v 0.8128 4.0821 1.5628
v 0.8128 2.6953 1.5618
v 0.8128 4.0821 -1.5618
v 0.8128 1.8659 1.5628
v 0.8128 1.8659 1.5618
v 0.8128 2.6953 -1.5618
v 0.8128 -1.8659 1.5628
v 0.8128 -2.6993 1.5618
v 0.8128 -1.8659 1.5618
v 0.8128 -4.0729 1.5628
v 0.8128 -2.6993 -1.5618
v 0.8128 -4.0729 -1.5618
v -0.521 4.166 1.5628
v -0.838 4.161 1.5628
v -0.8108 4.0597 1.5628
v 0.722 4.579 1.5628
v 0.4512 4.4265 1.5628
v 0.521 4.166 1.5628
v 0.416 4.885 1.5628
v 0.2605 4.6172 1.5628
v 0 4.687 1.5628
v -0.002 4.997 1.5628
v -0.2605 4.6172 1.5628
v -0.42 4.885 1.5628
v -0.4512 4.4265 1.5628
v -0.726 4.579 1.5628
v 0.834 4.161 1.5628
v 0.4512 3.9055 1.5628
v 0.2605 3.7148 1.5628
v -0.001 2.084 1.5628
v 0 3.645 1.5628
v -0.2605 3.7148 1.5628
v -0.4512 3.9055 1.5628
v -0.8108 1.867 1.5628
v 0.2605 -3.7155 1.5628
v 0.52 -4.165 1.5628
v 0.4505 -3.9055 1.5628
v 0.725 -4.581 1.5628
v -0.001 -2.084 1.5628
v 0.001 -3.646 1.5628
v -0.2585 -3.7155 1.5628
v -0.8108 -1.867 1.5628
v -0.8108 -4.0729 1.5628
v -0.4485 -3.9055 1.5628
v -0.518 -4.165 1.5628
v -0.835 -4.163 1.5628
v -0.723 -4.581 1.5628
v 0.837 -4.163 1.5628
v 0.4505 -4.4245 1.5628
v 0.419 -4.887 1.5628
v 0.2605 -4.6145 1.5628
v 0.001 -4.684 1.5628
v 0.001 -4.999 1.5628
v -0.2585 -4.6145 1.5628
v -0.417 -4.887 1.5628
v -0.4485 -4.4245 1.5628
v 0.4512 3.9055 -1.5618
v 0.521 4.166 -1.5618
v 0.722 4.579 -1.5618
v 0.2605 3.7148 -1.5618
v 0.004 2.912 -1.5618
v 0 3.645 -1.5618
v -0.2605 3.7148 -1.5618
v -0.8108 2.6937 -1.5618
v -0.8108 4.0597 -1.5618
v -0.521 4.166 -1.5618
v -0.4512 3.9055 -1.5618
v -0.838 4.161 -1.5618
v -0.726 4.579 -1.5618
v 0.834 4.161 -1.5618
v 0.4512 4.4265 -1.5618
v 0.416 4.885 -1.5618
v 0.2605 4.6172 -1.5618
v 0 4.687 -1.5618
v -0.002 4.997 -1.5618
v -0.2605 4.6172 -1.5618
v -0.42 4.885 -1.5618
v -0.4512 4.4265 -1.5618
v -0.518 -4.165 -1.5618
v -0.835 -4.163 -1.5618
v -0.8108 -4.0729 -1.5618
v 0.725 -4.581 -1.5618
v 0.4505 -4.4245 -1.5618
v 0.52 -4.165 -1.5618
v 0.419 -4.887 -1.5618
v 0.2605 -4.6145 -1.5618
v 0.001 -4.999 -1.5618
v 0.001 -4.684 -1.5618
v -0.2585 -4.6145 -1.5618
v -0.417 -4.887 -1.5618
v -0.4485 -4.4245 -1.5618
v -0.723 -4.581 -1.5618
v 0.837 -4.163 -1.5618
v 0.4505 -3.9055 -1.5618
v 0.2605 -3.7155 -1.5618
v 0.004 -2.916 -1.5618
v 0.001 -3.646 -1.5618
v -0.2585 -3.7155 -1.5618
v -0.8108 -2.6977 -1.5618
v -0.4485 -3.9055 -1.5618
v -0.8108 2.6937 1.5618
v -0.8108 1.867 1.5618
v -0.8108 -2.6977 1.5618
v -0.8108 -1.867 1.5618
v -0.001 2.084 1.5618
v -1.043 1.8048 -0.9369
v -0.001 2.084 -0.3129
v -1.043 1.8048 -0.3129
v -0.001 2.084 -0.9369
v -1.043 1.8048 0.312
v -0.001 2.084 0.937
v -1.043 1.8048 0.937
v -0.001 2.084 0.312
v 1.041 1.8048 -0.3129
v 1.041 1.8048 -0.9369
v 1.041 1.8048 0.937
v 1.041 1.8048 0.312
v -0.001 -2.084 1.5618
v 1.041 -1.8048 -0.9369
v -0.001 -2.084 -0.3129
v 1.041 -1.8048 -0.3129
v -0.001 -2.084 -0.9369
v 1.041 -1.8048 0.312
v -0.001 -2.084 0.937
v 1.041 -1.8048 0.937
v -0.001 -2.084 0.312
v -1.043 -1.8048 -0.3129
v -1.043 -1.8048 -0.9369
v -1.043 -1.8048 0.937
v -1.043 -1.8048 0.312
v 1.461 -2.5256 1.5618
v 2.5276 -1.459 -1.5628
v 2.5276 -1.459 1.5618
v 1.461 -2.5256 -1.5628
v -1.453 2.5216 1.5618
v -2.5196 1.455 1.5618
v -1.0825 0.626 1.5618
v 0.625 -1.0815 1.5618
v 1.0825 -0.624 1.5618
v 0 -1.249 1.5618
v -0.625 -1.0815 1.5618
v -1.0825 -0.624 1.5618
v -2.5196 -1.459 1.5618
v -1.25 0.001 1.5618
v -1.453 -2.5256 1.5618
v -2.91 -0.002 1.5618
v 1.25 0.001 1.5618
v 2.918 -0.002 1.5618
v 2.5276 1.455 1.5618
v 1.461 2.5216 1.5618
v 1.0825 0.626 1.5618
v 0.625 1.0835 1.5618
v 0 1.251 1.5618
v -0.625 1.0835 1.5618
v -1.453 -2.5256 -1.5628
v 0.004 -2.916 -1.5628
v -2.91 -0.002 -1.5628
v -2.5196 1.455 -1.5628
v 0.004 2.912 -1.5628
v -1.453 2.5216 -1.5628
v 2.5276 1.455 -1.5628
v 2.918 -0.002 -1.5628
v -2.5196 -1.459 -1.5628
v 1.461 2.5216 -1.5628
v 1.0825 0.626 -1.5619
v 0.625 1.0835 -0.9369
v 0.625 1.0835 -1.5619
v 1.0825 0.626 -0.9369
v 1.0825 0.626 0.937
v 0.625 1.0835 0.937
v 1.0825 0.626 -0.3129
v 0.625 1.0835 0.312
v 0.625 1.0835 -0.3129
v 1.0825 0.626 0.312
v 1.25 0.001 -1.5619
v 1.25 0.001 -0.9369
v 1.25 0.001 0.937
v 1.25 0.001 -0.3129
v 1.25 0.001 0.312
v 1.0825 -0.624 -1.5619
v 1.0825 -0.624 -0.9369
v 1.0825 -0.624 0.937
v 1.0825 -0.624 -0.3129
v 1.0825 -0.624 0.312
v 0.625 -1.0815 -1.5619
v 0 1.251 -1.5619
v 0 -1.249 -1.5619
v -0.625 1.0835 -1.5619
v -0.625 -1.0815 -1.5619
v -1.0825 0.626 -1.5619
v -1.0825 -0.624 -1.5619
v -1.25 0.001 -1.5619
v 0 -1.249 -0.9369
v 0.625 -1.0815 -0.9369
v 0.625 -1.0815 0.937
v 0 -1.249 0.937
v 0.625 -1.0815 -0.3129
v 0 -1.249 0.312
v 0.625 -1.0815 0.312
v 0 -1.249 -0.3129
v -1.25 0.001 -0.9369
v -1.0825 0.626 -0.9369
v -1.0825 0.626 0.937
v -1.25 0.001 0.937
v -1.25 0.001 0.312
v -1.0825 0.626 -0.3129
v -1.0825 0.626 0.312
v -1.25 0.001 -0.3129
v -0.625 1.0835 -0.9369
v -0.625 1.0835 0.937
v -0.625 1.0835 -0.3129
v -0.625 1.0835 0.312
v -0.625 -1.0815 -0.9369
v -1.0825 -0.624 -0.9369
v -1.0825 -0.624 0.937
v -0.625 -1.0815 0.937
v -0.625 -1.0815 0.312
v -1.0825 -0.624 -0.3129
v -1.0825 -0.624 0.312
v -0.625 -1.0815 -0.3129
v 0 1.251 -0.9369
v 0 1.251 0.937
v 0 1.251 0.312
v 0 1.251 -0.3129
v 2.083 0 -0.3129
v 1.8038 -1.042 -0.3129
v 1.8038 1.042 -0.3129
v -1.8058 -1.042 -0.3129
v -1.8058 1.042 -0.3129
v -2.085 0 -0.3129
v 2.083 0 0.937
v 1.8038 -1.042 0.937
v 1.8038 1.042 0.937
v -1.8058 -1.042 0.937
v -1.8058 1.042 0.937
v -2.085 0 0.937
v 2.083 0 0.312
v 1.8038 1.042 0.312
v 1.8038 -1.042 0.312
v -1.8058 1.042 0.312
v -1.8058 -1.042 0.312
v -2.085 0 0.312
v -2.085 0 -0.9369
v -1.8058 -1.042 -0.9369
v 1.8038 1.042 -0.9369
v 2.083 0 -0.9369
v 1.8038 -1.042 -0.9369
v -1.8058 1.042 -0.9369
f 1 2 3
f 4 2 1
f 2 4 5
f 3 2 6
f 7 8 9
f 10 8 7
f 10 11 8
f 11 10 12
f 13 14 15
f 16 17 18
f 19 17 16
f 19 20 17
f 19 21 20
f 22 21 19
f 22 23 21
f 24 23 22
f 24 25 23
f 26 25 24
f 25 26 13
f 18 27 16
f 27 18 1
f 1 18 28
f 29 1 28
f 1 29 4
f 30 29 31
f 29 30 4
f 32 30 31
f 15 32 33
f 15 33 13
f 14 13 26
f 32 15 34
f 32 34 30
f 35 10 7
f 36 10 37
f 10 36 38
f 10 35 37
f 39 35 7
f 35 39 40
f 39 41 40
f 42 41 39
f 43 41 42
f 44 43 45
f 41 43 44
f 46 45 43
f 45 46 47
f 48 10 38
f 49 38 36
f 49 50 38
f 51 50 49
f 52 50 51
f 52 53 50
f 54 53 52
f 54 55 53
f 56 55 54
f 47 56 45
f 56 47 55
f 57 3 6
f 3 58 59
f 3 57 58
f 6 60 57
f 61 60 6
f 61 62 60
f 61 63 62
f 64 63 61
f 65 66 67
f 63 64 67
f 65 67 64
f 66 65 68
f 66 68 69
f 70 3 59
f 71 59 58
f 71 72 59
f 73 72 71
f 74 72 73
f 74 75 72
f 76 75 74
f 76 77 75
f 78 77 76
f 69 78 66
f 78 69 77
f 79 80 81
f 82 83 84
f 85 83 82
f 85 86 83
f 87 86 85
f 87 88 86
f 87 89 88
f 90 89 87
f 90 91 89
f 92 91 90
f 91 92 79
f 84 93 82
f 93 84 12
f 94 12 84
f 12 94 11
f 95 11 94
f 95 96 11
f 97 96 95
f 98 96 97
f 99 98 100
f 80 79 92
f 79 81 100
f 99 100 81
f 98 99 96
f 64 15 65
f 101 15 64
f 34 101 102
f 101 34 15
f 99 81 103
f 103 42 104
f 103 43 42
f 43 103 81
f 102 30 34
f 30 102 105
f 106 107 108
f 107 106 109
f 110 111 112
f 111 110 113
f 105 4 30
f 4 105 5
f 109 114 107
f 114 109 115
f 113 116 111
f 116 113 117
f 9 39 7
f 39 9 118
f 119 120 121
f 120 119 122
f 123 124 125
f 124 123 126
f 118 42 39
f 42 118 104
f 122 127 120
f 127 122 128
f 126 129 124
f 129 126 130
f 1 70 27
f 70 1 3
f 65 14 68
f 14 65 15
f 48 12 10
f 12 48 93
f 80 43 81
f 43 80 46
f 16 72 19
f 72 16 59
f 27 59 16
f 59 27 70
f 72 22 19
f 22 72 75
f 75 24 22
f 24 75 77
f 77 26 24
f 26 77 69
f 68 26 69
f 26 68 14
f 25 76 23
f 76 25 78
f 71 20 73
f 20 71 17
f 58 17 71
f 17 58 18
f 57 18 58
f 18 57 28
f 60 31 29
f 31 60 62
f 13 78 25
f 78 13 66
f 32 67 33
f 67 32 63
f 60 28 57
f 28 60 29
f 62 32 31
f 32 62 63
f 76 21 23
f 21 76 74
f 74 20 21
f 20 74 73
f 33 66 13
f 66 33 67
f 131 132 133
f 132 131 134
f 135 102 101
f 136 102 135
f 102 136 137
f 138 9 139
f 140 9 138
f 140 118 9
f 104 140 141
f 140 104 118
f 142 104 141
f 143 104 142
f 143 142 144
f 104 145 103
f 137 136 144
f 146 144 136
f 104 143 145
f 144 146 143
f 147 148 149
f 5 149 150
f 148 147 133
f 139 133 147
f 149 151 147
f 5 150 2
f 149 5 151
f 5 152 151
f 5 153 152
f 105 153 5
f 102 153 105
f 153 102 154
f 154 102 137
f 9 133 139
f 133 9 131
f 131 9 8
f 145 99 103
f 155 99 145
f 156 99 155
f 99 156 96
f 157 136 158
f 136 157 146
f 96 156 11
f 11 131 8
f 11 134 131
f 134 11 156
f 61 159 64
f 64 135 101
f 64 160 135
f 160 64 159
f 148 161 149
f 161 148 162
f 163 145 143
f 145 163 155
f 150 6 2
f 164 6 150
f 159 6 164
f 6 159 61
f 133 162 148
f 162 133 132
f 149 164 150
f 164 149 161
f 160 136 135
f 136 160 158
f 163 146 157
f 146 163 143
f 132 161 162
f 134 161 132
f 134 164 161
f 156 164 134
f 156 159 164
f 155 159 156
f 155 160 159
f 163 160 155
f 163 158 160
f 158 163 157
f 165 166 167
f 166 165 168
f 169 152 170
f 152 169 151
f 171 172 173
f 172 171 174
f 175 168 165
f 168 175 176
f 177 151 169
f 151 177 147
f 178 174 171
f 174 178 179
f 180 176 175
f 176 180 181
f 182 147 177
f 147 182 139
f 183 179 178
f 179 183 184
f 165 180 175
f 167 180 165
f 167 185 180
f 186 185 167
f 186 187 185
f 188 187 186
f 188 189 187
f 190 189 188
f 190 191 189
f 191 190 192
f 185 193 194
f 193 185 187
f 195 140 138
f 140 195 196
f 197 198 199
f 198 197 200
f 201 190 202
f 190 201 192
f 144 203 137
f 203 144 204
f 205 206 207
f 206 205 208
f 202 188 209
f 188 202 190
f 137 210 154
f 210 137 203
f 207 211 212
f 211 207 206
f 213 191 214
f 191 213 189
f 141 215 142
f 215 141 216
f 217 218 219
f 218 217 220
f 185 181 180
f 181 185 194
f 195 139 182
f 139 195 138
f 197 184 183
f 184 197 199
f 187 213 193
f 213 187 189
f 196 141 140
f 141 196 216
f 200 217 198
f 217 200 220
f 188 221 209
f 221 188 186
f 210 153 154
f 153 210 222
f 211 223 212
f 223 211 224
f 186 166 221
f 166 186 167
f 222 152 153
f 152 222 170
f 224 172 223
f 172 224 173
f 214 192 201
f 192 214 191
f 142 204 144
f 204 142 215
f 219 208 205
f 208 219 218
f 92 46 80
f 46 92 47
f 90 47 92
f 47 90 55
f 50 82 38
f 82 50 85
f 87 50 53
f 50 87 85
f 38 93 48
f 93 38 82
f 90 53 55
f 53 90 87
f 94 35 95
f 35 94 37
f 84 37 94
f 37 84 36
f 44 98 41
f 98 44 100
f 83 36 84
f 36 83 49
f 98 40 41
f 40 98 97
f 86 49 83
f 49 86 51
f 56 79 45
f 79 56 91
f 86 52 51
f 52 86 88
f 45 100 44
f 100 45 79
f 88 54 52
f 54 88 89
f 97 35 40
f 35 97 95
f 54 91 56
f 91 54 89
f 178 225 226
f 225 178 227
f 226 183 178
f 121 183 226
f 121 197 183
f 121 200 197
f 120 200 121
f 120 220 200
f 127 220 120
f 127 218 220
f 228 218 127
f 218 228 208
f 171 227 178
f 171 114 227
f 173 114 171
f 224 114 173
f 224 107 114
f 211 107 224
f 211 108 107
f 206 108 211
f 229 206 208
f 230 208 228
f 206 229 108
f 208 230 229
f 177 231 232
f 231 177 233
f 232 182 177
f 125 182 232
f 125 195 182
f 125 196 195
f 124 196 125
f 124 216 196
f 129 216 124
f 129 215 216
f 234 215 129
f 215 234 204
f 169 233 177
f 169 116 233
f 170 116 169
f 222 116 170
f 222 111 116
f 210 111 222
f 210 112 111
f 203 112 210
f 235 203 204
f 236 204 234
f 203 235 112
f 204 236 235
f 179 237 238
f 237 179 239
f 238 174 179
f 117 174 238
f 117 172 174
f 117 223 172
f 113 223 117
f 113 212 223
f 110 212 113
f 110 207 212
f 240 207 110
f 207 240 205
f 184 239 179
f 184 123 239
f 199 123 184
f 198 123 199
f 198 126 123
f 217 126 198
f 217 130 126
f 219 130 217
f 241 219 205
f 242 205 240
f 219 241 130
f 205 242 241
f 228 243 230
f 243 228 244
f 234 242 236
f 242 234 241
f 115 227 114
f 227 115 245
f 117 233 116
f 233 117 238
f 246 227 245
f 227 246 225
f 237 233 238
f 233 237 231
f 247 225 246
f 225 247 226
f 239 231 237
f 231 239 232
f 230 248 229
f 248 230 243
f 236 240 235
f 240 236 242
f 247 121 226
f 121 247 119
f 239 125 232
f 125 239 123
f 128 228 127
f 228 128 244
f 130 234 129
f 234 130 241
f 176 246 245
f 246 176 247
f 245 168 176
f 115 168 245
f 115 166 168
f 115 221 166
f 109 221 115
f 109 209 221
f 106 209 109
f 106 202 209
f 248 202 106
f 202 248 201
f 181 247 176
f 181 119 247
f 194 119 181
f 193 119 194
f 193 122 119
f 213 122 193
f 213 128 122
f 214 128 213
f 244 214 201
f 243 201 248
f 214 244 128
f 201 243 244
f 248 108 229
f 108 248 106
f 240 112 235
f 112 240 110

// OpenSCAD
intersection() {
  cube(size = [6.9997, 11.9997, 3.7497], center = true);

  union() {
    difference() {
      difference() {
        translate([0.001, 0.0005, 0.0005])
        cube(size = [1.6237, 8.3307, 3.1247], center = true);
      
        translate([-0.001, 0, -8.2685])
        cylinder(h = 19.6628, r1 = 2.084, r2 = 2.084, center = true, $fn = 12);
      }
    
      union() {
        translate([-0.002, 4.161, 8.2695])
        cylinder(h = 19.6628, r1 = 0.836, r2 = 0.836, center = true, $fn = 12);
      
        translate([0.001, -4.163, 8.2695])
        cylinder(h = 19.6628, r1 = 0.836, r2 = 0.836, center = true, $fn = 12);
      }
    }
  
    difference() {
      translate([-0.002, 4.161, 0.0005])
      cylinder(h = 3.1247, r1 = 0.836, r2 = 0.836, center = true, $fn = 12);
    
      translate([0, 4.166, 0.0005])
      cylinder(h = 3.1248, r1 = 0.521, r2 = 0.521, center = true, $fn = 12);
    }
  
    difference() {
      union() {
        difference() {
          translate([0.004, -0.002, -0.0005])
          rotate([180, 0, 180])
          cylinder(h = 3.1247, r1 = 2.914, r2 = 2.914, center = true, $fn = 12);
        
          translate([0, 0.001, 8.2695])
          cylinder(h = 19.6628, r1 = 1.25, r2 = 1.25, center = true, $fn = 12);
        }
      
        difference() {
          translate([0.001, -4.163, 0.0005])
          cylinder(h = 3.1247, r1 = 0.836, r2 = 0.836, center = true, $fn = 12);
        
          translate([0.001, -4.165, -8.2685])
          cylinder(h = 19.6628, r1 = 0.519, r2 = 0.519, center = true, $fn = 12);
        }
      }
    
      difference() {
        translate([-0.001, 0, 8.582])
        cylinder(h = 19.0378, r1 = 2.084, r2 = 2.084, center = true, $fn = 12);
      
        difference() {
          translate([0, 0.0005, 0.6245])
          cube(size = [36.1999, 8.3309, 1.8749], center = true);
        
          translate([0.004, -0.002, 0.6245])
          rotate([180, 0, 180])
          cylinder(h = 0.625, r1 = 2.914, r2 = 2.914, center = true, $fn = 12);
        }
      }
    }
  }
}
